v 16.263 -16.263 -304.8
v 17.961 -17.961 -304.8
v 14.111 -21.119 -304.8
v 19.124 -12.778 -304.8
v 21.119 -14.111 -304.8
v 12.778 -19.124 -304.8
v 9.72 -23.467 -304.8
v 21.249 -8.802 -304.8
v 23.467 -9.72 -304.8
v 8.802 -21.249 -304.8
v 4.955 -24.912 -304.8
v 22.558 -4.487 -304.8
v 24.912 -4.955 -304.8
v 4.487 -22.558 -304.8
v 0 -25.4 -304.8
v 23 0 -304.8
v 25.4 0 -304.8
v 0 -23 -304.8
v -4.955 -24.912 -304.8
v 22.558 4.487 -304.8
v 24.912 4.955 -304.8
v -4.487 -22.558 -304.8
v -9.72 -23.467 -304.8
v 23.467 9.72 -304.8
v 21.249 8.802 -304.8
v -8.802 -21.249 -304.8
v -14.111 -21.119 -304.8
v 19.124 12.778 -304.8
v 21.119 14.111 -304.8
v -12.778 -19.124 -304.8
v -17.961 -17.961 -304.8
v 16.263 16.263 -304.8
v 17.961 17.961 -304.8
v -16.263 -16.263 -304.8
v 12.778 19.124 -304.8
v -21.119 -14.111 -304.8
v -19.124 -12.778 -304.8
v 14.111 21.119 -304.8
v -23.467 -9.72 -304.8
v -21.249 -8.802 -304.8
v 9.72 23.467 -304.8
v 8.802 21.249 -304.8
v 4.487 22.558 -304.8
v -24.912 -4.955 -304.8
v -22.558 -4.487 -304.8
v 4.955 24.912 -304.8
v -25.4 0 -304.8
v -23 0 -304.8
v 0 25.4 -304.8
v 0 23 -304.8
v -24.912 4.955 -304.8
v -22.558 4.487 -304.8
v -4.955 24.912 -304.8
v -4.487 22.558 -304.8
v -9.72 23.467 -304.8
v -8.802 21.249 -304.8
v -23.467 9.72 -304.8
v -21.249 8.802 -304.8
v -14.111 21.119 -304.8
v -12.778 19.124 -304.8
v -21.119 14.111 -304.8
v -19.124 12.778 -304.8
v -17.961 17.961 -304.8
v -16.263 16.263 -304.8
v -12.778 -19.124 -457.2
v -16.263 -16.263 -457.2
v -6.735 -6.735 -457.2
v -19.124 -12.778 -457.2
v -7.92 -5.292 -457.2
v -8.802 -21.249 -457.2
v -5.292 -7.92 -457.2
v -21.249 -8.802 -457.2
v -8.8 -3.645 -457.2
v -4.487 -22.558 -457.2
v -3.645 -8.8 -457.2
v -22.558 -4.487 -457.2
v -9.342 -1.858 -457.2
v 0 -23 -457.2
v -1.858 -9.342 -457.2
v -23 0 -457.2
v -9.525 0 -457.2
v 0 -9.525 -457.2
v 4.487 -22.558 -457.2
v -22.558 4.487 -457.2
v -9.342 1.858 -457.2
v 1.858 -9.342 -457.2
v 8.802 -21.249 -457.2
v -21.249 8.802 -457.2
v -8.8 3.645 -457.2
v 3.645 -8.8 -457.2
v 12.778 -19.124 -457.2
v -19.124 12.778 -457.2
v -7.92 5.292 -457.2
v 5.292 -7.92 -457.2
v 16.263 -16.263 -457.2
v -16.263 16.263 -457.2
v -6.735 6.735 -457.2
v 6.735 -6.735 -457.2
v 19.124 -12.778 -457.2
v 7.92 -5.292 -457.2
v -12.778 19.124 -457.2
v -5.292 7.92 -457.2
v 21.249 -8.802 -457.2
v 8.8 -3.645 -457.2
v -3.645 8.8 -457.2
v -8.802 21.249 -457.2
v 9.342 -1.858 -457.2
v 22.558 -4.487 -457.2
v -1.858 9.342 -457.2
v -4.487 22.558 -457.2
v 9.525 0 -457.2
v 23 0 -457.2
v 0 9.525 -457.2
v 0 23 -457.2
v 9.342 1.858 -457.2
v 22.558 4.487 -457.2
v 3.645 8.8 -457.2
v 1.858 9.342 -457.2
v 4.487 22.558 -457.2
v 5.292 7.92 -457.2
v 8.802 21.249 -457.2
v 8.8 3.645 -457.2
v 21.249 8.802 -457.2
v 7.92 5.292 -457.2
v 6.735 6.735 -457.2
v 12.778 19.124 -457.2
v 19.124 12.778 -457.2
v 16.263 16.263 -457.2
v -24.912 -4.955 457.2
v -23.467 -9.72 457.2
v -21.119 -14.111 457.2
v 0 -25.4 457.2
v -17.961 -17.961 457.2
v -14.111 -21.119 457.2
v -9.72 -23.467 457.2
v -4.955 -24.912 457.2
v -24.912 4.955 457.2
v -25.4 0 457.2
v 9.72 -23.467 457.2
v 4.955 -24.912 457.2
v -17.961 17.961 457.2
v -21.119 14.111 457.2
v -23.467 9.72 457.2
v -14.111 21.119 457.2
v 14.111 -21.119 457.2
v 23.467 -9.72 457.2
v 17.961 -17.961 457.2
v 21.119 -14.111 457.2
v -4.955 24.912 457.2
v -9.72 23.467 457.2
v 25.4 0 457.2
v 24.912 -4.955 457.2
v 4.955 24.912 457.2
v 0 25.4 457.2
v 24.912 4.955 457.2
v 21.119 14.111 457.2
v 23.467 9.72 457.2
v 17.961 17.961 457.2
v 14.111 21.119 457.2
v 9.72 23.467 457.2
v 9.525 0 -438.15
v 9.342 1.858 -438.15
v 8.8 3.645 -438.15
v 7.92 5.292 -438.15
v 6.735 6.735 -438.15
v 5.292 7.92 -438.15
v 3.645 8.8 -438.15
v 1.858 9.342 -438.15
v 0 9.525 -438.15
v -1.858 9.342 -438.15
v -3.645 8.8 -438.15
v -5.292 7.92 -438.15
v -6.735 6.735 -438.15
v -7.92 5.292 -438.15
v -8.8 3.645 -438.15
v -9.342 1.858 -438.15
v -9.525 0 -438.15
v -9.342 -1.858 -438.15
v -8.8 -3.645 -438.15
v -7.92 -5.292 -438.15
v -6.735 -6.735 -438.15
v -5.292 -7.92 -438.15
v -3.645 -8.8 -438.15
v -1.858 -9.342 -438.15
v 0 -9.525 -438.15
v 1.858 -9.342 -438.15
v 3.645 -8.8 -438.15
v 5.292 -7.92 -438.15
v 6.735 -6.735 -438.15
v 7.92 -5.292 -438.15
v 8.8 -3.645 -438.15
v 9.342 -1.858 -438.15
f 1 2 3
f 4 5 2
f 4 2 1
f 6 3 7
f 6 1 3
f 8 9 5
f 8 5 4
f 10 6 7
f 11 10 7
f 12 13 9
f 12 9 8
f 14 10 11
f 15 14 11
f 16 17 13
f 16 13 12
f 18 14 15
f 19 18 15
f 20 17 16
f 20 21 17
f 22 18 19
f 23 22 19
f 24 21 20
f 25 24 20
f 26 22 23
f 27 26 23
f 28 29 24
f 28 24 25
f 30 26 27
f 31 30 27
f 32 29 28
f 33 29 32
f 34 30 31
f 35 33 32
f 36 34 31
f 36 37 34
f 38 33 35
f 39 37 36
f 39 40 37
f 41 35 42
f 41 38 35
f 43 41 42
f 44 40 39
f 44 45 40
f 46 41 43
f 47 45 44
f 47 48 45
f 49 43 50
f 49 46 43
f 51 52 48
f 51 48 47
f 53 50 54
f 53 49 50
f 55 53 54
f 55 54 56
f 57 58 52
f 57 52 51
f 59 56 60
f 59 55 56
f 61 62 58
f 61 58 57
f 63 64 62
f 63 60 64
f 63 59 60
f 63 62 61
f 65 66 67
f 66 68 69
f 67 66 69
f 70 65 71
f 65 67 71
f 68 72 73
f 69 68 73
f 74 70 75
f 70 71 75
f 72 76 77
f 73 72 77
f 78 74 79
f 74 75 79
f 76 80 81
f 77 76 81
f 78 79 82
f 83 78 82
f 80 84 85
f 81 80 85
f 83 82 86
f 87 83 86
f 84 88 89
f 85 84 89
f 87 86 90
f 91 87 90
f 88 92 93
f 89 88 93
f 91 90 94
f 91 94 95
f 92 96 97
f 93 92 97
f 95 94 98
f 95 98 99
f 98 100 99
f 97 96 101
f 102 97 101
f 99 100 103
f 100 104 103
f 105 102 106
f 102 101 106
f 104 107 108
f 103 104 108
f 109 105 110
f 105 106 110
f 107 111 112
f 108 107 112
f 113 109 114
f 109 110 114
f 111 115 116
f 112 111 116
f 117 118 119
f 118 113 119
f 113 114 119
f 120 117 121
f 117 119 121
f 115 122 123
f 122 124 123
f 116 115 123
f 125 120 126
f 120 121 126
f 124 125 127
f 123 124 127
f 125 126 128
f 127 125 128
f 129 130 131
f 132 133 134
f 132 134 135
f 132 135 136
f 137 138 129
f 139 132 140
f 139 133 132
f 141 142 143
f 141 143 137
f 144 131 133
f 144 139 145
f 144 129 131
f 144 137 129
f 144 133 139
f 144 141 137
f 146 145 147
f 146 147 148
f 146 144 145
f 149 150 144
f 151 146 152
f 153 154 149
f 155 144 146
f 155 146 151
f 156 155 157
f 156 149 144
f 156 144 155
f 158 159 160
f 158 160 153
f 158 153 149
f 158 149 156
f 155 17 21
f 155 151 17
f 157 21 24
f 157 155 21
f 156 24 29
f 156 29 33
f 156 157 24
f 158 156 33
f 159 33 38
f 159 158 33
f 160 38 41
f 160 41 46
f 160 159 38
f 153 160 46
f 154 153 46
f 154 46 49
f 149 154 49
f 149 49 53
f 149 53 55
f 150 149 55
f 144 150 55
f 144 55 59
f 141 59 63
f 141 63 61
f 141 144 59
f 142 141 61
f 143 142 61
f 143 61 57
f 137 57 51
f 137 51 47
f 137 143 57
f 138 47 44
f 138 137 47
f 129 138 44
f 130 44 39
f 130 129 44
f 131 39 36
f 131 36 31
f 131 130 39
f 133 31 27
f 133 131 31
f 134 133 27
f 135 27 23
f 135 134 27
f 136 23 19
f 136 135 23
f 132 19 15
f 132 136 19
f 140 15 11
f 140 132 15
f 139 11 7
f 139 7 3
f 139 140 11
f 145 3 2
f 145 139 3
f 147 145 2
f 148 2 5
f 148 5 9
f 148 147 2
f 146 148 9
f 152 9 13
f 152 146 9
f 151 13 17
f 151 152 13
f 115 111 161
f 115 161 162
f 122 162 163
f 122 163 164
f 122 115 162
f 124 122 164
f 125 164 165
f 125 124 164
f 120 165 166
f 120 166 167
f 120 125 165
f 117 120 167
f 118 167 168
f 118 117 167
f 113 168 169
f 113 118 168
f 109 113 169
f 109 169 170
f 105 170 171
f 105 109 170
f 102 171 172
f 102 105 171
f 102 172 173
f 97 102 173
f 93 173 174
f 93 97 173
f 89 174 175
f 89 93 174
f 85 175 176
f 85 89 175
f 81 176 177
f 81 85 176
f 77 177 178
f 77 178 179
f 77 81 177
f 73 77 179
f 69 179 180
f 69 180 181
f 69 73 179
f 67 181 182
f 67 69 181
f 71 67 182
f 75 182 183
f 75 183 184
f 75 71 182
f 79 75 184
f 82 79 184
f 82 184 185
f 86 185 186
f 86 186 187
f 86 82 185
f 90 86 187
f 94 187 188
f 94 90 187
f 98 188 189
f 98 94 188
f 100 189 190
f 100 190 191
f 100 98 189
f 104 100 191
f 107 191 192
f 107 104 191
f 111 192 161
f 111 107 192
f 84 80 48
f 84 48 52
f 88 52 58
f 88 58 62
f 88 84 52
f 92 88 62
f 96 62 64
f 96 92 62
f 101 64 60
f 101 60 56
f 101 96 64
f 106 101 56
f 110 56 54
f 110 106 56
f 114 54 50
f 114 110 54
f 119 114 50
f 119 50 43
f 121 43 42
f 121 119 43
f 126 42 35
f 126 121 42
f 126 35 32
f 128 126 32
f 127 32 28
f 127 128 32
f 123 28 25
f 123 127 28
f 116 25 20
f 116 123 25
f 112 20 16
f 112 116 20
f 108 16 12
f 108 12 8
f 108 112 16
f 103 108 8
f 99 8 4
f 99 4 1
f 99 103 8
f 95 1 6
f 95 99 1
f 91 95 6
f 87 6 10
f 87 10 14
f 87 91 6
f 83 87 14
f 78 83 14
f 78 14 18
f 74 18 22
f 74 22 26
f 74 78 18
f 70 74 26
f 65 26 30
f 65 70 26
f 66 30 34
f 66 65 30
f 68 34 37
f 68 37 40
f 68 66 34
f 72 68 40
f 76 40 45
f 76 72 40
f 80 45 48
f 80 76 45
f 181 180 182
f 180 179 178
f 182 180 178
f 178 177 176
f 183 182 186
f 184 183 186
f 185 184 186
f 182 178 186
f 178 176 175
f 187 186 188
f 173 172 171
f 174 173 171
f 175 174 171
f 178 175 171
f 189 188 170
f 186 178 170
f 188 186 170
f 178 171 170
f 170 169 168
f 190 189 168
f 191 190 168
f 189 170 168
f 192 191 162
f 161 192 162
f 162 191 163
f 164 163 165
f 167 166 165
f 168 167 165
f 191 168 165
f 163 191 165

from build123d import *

# Parameters (mm, degrees)
SKETCH3_R                = 25.4
BOSS_EXTRUDE1_DEPTH      = 457.2
BOSS_EXTRUDE1_DEPTH_BACK = 457.2
SKETCH4_R                = 9.525
CUT_EXTRUDE2_DEPTH       = 19.05
SKETCH5_R                = 25.4
SKETCH5_R_2              = 23
CUT_EXTRUDE3_DEPTH       = 152.4


with BuildPart() as part:
    # Sketch3 → Boss-Extrude1 (new body, two sides)
    with BuildSketch(Plane.XY) as boss_extrude1_sk:
        Circle(SKETCH3_R)
    extrude(amount=BOSS_EXTRUDE1_DEPTH)
    extrude(boss_extrude1_sk.sketch, amount=-BOSS_EXTRUDE1_DEPTH_BACK)

    # Sketch4 → Cut-Extrude2 (cut)
    with BuildSketch(Plane.XY.offset(-457.2)):
        Circle(SKETCH4_R)
    extrude(amount=CUT_EXTRUDE2_DEPTH, mode=Mode.SUBTRACT)

    # Sketch5 → Cut-Extrude3 (cut)
    with BuildSketch(Plane(origin=(0, 0, -457.2), x_dir=(-1, 0, 0), z_dir=(0, 0, -1))):
        Circle(SKETCH5_R)
        Circle(SKETCH5_R_2, mode=Mode.SUBTRACT)
    extrude(amount=-CUT_EXTRUDE3_DEPTH, mode=Mode.SUBTRACT)


solid = part.part
